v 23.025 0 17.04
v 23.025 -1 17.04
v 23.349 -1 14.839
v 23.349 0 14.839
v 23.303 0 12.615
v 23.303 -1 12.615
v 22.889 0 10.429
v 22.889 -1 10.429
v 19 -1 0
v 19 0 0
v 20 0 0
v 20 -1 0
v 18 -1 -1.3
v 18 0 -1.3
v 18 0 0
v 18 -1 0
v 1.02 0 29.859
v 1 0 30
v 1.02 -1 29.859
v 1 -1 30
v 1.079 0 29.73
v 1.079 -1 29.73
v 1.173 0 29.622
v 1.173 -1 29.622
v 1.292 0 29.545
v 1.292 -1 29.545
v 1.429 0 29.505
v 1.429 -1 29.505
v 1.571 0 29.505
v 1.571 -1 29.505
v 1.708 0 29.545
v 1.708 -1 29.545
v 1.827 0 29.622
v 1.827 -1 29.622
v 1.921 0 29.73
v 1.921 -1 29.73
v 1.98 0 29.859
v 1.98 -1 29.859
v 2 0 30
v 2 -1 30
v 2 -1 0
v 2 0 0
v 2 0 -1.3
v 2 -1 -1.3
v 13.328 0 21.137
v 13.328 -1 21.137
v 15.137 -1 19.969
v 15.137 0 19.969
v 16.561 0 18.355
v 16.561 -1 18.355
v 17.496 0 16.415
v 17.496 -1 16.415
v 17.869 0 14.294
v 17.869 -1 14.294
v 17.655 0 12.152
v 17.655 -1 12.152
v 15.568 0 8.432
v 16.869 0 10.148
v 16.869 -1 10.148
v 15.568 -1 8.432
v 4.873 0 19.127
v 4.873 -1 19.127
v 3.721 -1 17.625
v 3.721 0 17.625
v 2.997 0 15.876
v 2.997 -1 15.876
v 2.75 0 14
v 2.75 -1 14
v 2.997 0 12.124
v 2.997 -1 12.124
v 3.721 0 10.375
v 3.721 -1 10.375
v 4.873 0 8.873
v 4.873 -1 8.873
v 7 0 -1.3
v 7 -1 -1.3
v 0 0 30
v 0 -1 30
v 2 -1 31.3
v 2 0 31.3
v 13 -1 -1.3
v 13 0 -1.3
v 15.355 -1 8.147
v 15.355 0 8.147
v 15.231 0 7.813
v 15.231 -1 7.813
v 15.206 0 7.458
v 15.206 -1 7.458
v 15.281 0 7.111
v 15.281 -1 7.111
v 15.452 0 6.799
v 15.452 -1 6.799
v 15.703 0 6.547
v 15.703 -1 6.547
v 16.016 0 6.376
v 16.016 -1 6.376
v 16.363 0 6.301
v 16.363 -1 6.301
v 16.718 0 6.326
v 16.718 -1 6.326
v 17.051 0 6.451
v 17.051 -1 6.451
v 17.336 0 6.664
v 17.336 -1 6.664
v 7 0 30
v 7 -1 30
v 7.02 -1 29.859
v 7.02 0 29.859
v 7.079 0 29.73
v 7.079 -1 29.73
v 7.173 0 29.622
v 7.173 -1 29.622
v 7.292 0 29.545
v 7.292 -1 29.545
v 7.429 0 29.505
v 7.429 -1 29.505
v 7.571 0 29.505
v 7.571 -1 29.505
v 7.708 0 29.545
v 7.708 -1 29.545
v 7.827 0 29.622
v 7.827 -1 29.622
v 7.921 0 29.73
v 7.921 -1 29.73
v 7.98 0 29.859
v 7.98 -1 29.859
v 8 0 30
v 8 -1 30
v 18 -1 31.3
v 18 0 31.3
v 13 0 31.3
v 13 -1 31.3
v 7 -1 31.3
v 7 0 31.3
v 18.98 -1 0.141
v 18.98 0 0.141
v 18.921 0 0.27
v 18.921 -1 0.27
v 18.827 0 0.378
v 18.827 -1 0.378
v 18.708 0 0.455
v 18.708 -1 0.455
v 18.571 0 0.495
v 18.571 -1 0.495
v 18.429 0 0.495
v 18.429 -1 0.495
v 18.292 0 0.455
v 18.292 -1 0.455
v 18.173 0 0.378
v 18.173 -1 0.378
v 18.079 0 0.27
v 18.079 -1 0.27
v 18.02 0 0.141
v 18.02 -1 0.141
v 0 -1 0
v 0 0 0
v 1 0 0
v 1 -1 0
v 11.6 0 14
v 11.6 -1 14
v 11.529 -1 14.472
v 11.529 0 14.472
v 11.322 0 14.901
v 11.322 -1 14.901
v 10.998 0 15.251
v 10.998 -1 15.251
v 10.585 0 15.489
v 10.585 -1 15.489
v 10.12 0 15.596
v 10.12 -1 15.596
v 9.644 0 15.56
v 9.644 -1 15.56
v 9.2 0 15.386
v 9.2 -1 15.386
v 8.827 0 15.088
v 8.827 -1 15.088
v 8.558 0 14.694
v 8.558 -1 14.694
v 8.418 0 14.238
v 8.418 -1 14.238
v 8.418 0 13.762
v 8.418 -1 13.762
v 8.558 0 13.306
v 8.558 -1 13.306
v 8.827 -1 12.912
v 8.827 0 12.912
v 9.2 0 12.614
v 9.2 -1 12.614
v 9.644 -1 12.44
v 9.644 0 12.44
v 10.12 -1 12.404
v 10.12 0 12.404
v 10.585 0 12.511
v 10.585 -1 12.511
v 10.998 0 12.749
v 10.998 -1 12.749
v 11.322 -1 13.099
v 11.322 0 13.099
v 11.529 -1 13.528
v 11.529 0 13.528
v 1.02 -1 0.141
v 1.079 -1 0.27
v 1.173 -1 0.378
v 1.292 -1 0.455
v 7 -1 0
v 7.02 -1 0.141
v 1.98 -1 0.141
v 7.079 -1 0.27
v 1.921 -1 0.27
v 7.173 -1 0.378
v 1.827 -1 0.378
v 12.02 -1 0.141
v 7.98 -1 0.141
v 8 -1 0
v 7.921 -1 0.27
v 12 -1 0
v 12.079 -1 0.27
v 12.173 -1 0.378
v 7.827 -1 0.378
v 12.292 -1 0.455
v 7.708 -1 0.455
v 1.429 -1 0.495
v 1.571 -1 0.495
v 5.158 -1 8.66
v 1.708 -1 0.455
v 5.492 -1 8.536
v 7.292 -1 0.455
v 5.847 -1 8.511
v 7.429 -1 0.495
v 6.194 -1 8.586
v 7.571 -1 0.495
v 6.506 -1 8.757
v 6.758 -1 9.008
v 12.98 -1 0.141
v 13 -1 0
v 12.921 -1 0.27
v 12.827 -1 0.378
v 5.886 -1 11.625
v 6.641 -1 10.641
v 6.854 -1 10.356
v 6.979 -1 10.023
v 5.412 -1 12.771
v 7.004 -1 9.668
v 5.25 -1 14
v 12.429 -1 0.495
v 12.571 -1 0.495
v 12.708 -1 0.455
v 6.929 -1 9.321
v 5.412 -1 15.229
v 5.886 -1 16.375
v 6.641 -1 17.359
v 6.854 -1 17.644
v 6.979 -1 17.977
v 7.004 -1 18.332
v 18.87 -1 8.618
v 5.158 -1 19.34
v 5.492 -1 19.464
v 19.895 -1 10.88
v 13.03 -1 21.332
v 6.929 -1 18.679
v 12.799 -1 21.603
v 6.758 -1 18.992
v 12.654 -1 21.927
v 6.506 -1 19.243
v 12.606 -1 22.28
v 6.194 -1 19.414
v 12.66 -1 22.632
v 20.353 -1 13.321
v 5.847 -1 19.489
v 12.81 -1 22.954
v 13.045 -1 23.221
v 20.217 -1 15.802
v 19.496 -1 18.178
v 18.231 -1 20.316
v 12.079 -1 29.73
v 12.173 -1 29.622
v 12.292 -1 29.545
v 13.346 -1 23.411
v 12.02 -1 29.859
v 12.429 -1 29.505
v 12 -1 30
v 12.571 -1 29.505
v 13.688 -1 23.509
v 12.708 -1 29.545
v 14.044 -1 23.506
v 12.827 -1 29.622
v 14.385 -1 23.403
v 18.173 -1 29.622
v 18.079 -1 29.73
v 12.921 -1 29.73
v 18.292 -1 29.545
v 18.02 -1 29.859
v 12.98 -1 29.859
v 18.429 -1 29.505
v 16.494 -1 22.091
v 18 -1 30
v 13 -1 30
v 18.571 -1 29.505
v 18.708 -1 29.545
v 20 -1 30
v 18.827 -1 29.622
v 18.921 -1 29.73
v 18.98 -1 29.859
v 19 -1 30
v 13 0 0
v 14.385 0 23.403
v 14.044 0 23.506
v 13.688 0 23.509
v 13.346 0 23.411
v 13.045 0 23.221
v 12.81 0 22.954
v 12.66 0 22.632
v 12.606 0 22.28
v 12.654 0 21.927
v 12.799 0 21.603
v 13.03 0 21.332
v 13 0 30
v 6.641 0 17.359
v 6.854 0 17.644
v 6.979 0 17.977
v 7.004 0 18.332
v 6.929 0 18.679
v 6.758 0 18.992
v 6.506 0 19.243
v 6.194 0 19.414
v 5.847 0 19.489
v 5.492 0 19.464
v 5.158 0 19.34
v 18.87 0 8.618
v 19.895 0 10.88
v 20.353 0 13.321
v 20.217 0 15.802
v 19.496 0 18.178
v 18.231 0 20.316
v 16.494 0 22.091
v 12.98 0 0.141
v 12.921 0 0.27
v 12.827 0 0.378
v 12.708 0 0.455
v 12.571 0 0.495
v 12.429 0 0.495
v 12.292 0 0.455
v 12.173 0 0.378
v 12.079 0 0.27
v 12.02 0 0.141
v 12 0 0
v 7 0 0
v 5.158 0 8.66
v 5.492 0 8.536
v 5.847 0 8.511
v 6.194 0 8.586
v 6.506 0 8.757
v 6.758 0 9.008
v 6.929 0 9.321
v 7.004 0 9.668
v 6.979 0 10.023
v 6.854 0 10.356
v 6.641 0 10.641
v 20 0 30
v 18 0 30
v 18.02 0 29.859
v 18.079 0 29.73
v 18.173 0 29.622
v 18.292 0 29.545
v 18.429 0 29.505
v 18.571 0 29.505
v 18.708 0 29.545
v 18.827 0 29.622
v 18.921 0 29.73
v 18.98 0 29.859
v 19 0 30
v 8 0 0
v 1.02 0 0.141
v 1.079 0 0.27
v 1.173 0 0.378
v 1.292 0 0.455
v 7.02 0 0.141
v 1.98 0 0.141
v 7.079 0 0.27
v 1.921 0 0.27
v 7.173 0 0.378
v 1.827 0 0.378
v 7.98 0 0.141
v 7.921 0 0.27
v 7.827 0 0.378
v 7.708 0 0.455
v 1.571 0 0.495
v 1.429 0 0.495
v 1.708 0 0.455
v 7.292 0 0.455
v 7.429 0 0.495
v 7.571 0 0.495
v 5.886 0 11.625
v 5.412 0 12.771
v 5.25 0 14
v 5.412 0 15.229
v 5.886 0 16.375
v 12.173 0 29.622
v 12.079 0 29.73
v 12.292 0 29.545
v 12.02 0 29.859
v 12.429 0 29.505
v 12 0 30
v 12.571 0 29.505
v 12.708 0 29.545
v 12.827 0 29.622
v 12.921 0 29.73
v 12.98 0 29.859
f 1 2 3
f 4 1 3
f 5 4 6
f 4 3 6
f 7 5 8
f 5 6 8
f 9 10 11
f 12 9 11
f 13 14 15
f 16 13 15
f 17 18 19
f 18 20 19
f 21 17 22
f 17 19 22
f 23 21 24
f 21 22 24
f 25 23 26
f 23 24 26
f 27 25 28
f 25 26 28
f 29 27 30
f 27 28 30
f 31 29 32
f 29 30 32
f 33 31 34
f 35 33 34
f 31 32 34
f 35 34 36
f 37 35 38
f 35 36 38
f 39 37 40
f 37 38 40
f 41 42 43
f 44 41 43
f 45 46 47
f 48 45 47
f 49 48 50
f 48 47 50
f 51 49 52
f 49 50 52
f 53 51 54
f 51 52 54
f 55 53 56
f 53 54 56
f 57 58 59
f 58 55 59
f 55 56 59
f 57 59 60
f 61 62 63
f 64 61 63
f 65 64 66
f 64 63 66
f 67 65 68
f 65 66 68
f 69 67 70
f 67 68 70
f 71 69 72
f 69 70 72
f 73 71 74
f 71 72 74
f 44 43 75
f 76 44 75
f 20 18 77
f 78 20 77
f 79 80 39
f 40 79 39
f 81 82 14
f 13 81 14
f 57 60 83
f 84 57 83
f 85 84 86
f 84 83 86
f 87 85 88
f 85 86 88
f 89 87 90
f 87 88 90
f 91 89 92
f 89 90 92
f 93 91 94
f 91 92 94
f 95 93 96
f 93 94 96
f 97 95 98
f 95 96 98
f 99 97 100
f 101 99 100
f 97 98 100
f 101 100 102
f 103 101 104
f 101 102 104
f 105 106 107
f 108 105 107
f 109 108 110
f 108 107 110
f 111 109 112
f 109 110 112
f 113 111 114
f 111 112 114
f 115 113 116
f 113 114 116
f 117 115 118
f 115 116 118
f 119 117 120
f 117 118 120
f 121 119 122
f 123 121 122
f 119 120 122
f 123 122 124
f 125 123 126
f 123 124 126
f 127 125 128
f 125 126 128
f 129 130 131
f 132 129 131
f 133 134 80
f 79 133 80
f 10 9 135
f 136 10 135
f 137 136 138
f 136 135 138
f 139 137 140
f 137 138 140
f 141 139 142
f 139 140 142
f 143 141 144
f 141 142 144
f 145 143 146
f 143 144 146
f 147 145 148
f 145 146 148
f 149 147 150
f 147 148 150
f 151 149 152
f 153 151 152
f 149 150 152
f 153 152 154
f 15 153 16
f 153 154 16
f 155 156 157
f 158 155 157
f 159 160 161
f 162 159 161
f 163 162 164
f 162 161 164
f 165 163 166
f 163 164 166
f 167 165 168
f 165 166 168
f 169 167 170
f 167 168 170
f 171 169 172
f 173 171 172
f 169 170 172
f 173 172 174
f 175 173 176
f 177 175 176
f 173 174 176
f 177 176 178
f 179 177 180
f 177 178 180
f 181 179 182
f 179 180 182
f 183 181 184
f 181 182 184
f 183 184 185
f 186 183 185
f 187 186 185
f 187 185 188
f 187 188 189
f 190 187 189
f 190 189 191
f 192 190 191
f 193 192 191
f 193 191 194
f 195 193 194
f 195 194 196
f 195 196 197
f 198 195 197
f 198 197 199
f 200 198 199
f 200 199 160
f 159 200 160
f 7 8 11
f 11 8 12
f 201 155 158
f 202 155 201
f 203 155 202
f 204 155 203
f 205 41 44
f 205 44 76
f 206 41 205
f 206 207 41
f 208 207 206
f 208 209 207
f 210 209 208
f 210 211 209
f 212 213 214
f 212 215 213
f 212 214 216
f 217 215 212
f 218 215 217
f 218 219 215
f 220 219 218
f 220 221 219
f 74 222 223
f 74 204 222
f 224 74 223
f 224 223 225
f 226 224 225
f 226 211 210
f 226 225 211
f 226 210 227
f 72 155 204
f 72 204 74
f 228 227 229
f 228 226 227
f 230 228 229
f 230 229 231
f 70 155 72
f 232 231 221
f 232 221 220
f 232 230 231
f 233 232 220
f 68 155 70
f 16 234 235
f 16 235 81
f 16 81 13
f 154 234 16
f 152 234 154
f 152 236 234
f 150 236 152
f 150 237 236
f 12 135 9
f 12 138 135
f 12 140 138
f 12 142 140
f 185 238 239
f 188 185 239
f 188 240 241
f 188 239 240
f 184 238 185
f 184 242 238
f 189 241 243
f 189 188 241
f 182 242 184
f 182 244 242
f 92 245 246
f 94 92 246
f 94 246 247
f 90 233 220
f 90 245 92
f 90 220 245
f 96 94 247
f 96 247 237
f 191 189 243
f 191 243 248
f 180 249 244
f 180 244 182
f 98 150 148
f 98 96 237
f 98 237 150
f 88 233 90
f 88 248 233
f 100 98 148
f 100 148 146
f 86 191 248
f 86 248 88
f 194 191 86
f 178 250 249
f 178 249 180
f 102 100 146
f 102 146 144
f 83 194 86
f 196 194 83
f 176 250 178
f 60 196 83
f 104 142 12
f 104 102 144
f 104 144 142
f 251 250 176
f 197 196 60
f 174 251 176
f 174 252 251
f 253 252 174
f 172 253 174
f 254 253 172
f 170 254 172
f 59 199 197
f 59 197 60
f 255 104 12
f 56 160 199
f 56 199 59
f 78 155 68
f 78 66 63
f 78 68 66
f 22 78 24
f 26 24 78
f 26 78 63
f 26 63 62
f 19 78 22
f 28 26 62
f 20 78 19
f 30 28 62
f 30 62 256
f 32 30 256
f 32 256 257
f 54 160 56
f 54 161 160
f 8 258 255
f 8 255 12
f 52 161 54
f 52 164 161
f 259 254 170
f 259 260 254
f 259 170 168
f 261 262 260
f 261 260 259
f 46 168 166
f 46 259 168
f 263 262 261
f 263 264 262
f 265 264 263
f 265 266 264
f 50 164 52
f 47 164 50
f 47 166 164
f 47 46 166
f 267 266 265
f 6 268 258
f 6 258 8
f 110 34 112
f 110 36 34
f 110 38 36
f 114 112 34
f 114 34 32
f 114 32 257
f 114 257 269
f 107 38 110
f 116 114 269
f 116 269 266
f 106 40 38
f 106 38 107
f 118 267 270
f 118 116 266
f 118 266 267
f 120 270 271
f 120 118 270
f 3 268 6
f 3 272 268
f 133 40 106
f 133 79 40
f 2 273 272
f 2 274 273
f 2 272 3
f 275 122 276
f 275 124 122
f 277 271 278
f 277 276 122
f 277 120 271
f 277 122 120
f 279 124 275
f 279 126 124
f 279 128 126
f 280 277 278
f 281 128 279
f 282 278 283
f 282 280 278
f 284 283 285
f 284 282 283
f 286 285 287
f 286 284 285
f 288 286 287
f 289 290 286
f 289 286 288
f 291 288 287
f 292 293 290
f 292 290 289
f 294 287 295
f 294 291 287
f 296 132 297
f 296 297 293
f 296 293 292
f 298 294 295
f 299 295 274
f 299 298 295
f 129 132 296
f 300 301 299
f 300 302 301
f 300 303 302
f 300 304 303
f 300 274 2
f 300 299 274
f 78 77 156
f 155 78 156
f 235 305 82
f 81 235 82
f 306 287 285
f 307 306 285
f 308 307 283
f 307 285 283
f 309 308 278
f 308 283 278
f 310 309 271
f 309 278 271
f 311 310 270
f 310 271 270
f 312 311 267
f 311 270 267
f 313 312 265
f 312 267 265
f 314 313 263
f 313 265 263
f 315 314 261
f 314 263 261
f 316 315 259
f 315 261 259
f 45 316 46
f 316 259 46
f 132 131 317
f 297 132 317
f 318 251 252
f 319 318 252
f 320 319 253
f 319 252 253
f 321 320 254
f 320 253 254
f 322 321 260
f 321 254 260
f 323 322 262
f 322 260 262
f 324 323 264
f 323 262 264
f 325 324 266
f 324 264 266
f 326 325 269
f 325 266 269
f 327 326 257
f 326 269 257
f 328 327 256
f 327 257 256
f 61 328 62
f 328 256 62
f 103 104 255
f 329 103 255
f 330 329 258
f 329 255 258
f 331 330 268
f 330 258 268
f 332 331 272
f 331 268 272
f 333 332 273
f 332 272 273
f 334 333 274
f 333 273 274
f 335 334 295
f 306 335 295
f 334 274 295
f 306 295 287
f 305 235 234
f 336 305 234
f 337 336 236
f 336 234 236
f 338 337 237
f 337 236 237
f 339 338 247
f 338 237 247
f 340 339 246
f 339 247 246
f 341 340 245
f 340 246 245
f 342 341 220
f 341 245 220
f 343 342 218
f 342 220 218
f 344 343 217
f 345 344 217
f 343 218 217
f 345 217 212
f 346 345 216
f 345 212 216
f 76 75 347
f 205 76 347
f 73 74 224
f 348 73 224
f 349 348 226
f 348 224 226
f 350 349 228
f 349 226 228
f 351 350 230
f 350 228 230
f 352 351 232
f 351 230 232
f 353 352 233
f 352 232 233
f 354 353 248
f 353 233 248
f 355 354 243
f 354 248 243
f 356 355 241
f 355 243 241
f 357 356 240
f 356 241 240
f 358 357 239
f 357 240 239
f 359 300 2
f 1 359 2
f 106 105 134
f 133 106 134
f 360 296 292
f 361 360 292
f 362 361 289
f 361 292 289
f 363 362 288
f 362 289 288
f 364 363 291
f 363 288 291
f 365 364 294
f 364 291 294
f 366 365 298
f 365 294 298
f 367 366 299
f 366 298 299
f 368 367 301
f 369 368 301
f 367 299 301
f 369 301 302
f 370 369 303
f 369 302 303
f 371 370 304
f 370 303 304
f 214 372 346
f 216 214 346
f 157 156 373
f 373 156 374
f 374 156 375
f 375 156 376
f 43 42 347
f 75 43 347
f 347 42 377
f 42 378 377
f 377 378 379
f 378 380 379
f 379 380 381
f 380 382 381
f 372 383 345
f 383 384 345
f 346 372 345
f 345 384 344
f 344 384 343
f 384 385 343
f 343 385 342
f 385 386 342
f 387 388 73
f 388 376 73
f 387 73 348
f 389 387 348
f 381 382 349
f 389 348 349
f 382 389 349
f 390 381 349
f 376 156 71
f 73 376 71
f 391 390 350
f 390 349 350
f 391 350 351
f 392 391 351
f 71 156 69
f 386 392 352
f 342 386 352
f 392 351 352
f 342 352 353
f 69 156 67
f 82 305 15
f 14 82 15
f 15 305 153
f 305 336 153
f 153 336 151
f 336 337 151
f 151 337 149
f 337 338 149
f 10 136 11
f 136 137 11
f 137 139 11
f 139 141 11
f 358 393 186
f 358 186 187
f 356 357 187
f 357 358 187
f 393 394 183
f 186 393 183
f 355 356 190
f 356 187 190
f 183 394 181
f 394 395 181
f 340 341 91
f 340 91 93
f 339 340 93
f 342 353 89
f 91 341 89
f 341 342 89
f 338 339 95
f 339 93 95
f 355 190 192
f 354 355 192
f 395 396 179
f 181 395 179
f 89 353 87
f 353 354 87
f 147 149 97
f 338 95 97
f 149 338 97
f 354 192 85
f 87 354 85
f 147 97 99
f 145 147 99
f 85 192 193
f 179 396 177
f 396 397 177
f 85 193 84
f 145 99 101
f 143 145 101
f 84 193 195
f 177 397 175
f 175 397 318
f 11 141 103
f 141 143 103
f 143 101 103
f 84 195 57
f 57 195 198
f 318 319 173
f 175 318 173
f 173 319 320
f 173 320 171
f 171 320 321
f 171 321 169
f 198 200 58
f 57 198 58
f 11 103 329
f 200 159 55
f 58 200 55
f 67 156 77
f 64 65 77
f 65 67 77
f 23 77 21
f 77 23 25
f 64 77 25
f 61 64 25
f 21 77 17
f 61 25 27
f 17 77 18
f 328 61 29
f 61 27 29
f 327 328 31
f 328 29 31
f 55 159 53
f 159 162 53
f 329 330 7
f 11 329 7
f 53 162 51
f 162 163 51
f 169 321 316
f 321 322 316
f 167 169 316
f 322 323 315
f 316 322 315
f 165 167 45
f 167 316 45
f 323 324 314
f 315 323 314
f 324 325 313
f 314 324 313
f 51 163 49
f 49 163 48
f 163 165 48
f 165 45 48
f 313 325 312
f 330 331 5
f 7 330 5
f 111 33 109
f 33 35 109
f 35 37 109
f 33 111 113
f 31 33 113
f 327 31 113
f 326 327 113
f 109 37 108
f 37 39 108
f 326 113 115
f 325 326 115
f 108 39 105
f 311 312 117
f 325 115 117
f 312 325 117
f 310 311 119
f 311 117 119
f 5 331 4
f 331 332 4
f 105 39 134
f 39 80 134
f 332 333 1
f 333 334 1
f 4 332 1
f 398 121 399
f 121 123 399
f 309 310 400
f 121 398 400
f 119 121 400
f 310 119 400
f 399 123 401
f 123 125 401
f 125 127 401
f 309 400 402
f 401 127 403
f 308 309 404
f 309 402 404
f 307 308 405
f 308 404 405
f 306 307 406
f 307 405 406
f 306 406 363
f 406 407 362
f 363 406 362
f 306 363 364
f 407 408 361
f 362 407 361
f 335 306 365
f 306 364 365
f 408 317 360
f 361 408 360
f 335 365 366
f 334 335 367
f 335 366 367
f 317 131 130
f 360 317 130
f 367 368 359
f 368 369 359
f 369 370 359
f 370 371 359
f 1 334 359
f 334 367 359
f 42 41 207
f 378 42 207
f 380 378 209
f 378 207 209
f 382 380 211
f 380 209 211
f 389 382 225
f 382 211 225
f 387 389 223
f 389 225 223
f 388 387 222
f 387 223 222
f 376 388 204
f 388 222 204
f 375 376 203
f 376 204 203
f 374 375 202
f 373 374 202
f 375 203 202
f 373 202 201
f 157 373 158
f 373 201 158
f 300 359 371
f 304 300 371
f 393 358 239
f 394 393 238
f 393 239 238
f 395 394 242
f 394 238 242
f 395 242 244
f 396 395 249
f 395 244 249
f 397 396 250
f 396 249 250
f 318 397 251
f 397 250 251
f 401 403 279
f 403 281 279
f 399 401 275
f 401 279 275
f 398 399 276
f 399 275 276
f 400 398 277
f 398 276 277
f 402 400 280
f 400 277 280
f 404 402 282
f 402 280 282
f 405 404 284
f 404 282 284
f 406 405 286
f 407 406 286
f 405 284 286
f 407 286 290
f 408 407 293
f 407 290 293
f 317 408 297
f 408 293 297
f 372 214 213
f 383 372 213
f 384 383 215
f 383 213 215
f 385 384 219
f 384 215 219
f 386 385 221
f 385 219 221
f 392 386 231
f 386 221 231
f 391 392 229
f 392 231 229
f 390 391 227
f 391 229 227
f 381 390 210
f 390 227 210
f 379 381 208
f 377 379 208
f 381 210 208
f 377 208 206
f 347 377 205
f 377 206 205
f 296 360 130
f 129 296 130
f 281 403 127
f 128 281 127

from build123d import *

# Parameters (mm, degrees)
F1_DEPTH = 1
F2_R     = 1.6
F3_DEPTH = 1.001
F4_R     = 0.5
F5_DEPTH = 1.001
F7_DEPTH = 1.001


with BuildPart() as f1:
    # F0 (on Front) → F1 (new body)
    with BuildSketch(Plane.XZ):
        Polygon((2, 30), (0, 30), (0, 0), (2, 0), (2, -1.3), (7, -1.3), (7, 0), (13, 0), (13, -1.3), (18, -1.3), (18, 0), (25, 0), (25, 30), (18, 30), (18, 31.3), (13, 31.3), (13, 30), (7, 30), (7, 31.3), (2, 31.3), align=None)
    extrude(amount=F1_DEPTH)

    # F2 (on face) → F3 (cut, through all)
    with BuildSketch(Plane.XZ.offset(1)):
        with Locations((10, 14)):
            Circle(F2_R)
        with BuildLine():
            ThreePointArc((13.328119, 21.137174), (17.755361, 15.367479), (15.568466, 8.431534))
            ThreePointArc((15.568466, 8.431534), (15.568466, 6.663767), (17.336233, 6.663767))
            ThreePointArc((17.336233, 6.663767), (20.21738, 15.8016), (14.384664, 23.402943))
            ThreePointArc((14.384664, 23.402943), (12.723507, 22.798331), (13.328119, 21.137174))
        make_face()
        with BuildLine():
            ThreePointArc((6.641243, 10.641243), (5.25, 14), (6.641243, 17.358757))
            ThreePointArc((6.641243, 17.358757), (6.641243, 19.126524), (4.873476, 19.126524))
            ThreePointArc((4.873476, 19.126524), (2.75, 14), (4.873476, 8.873476))
            ThreePointArc((4.873476, 8.873476), (6.641243, 8.873476), (6.641243, 10.641243))
        make_face()
    extrude(amount=-F3_DEPTH, mode=Mode.SUBTRACT)

    # F4 (on face) → F5 (cut, through all)
    with BuildSketch(Plane.XZ.offset(1)):
        with Locations((1.5, 30)):
            Circle(F4_R)
        with Locations((7.5, 30)):
            Circle(F4_R)
        with Locations((12.5, 30)):
            Circle(F4_R)
        with Locations((18.5, 30)):
            Circle(F4_R)
        with Locations((1.5, 0)):
            Circle(F4_R)
        with Locations((7.5, 0)):
            Circle(F4_R)
        with Locations((12.5, 0)):
            Circle(F4_R)
        with Locations((18.5, 0)):
            Circle(F4_R)
    extrude(amount=-F5_DEPTH, mode=Mode.SUBTRACT)

    # F6 (on face) → F7 (cut, through all)
    with BuildSketch(Plane.XZ.offset(1)):
        with BuildLine():
            Line((20, 0), (25, 0))
            Line((25, 0), (25, 30))
            Line((25, 30), (20, 30))
            Line((20, 30), (23.024917, 17.040091))
            ThreePointArc((23.024917, 17.040091), (23.372192, 13.725957), (22.88943, 10.428834))
            Line((22.88943, 10.428834), (20, 0))
        make_face()
    extrude(amount=-F7_DEPTH, mode=Mode.SUBTRACT)


solid = f1.part
